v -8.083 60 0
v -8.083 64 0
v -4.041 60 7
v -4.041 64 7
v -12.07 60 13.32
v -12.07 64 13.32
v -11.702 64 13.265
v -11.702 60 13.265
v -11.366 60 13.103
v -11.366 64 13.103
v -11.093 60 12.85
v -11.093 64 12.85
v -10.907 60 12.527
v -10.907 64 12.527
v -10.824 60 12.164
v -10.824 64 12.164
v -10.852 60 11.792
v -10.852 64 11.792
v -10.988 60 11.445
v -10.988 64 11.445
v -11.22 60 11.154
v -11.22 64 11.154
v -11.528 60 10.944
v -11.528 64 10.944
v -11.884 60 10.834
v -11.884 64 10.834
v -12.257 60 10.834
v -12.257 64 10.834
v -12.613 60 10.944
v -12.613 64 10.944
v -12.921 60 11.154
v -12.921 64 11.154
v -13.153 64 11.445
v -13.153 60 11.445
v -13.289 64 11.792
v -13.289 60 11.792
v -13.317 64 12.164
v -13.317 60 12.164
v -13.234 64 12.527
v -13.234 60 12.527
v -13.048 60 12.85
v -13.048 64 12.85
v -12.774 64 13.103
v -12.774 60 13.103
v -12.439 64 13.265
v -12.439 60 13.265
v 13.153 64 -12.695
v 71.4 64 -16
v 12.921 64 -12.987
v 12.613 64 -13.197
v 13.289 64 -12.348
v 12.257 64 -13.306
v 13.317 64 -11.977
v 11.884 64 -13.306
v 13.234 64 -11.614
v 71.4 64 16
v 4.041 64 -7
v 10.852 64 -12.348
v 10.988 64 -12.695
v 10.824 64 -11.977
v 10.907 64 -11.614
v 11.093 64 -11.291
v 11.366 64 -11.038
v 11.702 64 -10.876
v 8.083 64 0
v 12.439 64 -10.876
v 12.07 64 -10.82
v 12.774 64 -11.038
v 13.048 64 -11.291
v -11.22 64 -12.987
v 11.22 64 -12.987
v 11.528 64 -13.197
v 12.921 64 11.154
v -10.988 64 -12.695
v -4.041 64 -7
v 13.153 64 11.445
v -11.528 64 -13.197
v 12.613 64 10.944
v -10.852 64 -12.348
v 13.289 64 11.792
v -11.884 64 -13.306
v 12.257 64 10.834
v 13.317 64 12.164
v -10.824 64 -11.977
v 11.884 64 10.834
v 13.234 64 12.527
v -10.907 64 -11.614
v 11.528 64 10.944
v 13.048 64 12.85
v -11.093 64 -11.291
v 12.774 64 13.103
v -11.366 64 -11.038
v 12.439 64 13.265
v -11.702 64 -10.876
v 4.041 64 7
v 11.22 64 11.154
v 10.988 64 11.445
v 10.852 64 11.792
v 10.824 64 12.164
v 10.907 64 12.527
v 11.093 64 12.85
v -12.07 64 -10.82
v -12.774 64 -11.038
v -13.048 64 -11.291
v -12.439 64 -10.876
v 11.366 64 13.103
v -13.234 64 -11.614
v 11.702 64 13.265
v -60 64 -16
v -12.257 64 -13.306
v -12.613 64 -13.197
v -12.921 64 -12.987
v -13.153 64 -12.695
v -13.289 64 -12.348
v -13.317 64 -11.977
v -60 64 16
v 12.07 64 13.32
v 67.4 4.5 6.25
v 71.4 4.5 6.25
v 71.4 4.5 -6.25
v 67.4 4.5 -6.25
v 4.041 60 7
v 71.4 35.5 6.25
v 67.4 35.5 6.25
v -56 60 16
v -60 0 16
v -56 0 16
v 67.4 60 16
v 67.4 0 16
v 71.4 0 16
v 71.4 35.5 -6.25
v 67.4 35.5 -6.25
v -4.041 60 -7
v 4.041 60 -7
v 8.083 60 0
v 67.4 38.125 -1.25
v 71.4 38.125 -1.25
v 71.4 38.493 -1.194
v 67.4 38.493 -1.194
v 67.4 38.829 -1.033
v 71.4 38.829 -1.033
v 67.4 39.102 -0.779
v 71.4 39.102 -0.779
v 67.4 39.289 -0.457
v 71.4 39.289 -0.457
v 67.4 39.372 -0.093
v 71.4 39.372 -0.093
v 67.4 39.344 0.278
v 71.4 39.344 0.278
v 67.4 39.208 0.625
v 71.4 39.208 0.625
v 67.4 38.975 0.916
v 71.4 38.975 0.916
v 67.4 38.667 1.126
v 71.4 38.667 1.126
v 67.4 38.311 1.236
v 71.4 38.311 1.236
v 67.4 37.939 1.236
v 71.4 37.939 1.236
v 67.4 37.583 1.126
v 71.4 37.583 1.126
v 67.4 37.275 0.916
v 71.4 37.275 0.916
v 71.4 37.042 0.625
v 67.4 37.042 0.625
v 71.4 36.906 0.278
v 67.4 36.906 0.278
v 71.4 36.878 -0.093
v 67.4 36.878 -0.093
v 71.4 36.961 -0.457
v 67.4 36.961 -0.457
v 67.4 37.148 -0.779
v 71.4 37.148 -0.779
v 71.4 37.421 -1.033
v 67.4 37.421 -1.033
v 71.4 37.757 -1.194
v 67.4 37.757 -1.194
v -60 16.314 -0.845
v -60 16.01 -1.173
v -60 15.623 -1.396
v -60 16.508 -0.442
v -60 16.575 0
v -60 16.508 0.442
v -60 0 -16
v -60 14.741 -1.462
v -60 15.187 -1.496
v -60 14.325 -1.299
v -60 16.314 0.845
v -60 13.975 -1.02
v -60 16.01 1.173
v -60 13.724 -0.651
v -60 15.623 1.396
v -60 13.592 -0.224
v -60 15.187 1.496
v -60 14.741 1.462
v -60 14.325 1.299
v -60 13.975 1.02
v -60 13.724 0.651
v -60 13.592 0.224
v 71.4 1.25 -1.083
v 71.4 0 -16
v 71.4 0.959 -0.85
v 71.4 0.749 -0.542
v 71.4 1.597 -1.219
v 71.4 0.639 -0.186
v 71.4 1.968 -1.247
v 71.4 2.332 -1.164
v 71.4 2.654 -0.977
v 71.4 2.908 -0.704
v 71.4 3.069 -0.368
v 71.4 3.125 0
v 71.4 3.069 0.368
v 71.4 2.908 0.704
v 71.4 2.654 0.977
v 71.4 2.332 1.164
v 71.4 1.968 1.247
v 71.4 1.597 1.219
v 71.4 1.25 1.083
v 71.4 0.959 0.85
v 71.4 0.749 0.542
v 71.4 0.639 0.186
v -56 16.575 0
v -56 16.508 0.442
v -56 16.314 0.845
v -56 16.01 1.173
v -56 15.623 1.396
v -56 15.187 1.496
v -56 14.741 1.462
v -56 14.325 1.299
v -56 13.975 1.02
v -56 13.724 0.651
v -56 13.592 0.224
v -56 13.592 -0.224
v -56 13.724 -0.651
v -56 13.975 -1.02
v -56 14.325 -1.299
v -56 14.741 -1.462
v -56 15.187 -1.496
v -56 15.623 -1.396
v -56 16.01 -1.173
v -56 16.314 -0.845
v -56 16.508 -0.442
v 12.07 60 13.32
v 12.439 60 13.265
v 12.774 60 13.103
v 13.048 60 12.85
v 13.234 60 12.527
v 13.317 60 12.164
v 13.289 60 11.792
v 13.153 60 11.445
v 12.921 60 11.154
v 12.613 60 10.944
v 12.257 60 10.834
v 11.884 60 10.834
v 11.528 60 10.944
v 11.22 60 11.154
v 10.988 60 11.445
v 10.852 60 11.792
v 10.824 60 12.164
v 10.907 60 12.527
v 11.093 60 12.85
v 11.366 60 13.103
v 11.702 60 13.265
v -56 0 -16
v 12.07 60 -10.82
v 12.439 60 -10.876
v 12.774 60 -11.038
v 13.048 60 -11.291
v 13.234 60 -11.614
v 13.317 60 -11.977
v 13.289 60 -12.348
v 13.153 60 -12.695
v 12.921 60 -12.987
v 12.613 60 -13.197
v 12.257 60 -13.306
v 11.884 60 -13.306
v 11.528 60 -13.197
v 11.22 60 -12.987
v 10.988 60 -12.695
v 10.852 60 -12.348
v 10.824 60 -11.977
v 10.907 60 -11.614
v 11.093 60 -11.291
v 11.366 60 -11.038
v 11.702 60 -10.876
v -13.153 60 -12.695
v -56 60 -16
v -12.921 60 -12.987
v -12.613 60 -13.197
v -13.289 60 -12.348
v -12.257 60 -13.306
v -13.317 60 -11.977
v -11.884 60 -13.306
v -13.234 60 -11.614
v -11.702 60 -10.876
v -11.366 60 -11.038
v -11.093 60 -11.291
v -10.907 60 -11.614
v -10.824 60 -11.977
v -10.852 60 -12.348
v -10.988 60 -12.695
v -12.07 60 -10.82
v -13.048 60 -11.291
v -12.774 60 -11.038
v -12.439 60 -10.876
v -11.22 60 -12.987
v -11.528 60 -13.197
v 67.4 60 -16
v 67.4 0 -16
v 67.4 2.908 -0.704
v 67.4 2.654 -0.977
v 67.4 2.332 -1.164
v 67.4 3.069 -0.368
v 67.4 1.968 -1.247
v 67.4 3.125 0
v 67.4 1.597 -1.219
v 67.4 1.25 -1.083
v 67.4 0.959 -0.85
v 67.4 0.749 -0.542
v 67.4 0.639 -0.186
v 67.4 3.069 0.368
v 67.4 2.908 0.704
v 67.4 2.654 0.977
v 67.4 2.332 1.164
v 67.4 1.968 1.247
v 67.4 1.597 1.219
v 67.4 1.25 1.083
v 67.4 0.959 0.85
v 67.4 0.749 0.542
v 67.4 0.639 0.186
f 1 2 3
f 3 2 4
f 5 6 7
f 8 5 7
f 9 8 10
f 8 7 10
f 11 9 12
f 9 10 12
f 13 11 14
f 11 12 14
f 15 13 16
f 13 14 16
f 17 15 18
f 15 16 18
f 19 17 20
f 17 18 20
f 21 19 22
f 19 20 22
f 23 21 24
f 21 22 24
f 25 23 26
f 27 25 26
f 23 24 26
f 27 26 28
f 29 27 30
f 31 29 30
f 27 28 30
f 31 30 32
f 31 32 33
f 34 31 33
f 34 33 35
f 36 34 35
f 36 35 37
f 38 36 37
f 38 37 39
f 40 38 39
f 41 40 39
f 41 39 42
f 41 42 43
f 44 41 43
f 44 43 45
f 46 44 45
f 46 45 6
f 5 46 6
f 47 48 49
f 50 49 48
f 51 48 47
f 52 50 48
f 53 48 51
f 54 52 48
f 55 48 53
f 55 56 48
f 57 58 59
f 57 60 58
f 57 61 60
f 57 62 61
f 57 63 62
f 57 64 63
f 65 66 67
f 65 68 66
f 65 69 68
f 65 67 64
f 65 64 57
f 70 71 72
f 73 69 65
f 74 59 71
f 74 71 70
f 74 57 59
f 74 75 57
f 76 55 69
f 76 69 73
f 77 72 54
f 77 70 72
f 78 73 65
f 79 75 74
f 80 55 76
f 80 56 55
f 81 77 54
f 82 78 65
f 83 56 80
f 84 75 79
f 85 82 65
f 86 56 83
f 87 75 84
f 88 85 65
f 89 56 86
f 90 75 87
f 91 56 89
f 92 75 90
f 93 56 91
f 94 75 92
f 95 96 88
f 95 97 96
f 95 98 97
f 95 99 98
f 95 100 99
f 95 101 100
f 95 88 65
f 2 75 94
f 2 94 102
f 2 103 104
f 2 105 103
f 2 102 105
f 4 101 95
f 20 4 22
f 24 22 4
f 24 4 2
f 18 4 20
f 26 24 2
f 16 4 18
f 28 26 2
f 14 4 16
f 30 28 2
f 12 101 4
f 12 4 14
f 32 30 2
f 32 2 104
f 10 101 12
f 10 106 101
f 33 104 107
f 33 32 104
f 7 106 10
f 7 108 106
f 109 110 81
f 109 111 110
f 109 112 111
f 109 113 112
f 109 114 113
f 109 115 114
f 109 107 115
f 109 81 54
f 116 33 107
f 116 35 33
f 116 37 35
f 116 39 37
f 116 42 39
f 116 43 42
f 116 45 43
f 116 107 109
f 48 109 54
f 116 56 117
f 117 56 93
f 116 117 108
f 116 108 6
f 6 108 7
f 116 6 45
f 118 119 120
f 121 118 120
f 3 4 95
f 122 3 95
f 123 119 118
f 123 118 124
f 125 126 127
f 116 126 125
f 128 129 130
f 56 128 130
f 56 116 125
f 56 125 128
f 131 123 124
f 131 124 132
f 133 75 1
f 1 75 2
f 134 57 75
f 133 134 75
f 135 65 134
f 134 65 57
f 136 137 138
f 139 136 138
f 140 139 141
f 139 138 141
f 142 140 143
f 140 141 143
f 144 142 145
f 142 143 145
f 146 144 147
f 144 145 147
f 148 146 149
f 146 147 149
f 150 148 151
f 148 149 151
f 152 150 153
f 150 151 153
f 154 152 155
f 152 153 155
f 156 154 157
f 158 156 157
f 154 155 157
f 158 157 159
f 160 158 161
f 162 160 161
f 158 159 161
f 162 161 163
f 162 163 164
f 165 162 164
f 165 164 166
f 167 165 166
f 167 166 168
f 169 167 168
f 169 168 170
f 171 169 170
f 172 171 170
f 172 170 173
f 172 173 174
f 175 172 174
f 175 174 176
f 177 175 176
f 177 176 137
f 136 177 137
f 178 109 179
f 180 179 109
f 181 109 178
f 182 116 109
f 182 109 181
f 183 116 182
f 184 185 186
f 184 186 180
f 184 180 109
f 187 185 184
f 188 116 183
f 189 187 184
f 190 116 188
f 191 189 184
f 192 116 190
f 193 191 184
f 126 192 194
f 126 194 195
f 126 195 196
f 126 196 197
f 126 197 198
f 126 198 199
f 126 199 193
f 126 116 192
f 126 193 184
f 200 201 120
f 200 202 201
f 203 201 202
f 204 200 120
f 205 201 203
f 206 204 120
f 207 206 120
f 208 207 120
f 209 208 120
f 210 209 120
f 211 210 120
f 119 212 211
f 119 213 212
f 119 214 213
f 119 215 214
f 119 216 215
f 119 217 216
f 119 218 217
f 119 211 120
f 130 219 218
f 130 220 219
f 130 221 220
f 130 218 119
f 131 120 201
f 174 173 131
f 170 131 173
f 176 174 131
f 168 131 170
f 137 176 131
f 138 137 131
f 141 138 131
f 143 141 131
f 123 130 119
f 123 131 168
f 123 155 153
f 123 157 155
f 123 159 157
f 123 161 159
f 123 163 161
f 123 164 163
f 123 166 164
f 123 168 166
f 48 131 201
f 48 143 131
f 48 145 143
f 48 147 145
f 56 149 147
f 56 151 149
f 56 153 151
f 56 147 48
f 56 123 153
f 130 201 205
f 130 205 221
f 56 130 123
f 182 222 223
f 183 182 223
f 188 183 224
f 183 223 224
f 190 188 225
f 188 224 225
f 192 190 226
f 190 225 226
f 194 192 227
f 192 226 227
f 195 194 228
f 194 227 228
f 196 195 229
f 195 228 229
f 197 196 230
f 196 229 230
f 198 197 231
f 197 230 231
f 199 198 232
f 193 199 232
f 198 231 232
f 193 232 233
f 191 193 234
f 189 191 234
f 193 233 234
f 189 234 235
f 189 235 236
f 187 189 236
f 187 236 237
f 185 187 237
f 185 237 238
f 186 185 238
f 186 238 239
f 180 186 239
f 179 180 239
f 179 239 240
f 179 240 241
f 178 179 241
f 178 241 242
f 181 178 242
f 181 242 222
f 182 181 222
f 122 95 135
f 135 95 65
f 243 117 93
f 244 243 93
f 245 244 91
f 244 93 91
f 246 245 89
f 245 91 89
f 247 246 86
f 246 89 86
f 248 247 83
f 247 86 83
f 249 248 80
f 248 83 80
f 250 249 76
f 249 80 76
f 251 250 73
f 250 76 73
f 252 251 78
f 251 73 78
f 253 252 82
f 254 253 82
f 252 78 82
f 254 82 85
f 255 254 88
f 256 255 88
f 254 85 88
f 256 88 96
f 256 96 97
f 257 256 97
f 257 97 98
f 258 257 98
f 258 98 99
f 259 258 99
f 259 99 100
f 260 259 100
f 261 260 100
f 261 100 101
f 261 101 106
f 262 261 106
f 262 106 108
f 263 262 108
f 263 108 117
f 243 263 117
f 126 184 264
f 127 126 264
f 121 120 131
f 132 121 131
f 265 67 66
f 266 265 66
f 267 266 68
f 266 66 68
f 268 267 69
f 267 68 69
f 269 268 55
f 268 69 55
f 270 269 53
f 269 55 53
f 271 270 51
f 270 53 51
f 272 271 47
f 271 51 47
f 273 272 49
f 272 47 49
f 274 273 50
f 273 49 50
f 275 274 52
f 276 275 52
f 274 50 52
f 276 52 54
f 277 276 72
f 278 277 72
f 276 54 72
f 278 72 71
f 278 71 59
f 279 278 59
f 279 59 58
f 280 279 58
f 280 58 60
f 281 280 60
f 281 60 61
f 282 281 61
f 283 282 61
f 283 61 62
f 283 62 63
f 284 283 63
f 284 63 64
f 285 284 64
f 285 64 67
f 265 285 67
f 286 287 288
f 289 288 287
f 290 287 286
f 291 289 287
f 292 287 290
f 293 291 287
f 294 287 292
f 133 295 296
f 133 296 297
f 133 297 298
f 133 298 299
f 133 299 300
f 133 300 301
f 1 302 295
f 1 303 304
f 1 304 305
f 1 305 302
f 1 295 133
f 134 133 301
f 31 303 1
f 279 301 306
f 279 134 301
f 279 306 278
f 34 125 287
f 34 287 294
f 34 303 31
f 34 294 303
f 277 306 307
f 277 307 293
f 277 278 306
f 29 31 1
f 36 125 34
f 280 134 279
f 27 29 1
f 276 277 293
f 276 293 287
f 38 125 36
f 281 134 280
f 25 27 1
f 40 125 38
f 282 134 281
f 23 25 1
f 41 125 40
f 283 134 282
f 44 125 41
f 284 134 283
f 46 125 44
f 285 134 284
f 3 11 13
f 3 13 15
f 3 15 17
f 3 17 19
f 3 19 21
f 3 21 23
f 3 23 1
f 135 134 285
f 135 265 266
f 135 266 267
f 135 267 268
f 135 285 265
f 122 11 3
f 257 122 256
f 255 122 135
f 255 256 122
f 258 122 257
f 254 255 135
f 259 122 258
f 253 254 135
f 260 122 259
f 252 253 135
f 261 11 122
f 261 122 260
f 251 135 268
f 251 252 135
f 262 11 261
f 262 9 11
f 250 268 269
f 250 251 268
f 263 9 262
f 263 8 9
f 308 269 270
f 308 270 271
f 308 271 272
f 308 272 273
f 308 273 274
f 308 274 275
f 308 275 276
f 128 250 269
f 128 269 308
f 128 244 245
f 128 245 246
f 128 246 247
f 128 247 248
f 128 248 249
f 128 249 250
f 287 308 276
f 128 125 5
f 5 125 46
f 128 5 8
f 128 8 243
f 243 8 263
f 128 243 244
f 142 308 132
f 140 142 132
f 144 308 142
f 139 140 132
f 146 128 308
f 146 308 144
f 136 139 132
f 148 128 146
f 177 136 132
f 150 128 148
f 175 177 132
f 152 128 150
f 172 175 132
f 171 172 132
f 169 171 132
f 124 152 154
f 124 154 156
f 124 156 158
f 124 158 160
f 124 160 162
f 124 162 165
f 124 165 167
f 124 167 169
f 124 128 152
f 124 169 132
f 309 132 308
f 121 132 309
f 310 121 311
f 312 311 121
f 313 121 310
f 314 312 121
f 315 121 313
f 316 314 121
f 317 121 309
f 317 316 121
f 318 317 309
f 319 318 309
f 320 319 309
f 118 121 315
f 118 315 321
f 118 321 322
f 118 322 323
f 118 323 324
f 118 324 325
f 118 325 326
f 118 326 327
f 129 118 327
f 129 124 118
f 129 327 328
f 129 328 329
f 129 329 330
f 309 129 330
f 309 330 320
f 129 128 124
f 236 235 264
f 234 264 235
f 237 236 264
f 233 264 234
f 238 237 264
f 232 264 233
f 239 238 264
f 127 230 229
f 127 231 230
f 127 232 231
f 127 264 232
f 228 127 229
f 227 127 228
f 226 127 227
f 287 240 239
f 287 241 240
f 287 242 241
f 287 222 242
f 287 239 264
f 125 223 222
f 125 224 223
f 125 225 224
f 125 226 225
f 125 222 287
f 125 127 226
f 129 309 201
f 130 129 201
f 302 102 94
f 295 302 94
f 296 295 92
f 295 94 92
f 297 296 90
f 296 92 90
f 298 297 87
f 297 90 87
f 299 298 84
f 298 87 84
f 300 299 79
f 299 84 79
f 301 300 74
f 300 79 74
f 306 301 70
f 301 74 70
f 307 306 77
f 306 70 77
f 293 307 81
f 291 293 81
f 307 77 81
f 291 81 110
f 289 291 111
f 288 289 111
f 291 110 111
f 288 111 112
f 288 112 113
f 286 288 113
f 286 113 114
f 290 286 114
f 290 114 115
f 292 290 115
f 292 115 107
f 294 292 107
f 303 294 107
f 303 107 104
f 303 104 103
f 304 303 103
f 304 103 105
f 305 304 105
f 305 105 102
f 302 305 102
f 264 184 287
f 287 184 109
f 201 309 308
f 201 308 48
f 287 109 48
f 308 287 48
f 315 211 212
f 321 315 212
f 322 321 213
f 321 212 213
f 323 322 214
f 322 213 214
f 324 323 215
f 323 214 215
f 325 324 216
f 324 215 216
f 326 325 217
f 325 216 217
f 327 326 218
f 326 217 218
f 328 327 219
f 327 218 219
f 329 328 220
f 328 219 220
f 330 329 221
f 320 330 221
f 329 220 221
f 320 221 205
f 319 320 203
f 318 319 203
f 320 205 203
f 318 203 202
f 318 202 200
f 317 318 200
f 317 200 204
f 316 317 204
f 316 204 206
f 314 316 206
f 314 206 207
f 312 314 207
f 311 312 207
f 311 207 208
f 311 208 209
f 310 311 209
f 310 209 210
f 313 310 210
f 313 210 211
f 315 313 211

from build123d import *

# Parameters (mm, degrees)
BOSS_EXTRUDE1_DEPTH = 16
CUT_EXTRUDE2_REACH  = 149.03
SKETCH5_R           = 1.25
SKETCH5_W           = 12.5
SKETCH5_H           = 31
SKETCH5_3_R         = 1.5
CUT_EXTRUDE3_DEPTH  = 148.030473032
CUT_EXTRUDE1_REACH  = 99.211
SKETCH3_R           = 1.25


with BuildPart() as part:
    # Sketch1 → Boss-Extrude1 (new, symmetric)
    with BuildSketch(Plane.XY):
        Polygon((-56, 0), (-56, 60), (67.4, 60), (67.4, 0), (71.4, 0), (71.4, 64), (-60, 64), (-60, 0), align=None)
    extrude(amount=BOSS_EXTRUDE1_DEPTH, both=True)

    # Sketch5 → Cut-Extrude2 (cut, up to next)
    with BuildSketch(Plane(origin=(71.4, 0, 0), x_dir=(0, 0, -1), z_dir=(1, 0, 0)), mode=Mode.PRIVATE) as cut_extrude2_sk1:
        with Locations((0, 1.875)):
            Circle(SKETCH5_R)
    cut_extrude2_tool1 = extrude(cut_extrude2_sk1.sketch, amount=-CUT_EXTRUDE2_REACH, mode=Mode.PRIVATE) & part.part
    # Sketch5 → Cut-Extrude2 (cut, up to next)
    with BuildSketch(Plane(origin=(71.4, 0, 0), x_dir=(0, 0, -1), z_dir=(1, 0, 0)), mode=Mode.PRIVATE) as cut_extrude2_sk2:
        with Locations((0, 38.125)):
            Circle(SKETCH5_R)
    cut_extrude2_tool2 = extrude(cut_extrude2_sk2.sketch, amount=-CUT_EXTRUDE2_REACH, mode=Mode.PRIVATE) & part.part
    # Sketch5 → Cut-Extrude2 (cut, up to next)
    with BuildSketch(Plane(origin=(71.4, 0, 0), x_dir=(0, 0, -1), z_dir=(1, 0, 0)), mode=Mode.PRIVATE) as cut_extrude2_sk3:
        with Locations((0, 20)):
            Rectangle(SKETCH5_W, SKETCH5_H)
    cut_extrude2_tool3 = extrude(cut_extrude2_sk3.sketch, amount=-CUT_EXTRUDE2_REACH, mode=Mode.PRIVATE) & part.part
    add(cut_extrude2_tool1.solids().sort_by_distance((71.4, 1.875, 0))[0], mode=Mode.SUBTRACT)
    add(cut_extrude2_tool2.solids().sort_by_distance((71.4, 38.125, 0))[0], mode=Mode.SUBTRACT)
    add(cut_extrude2_tool3.solids().sort_by_distance((71.4, 20, 0))[0], mode=Mode.SUBTRACT)

    # Sketch5<3> → Cut-Extrude3 (cut, through all)
    with BuildSketch(Plane(origin=(71.4, 0, 0), x_dir=(0, 0, -1), z_dir=(1, 0, 0))):
        with Locations((0, 15.075)):
            Circle(SKETCH5_3_R)
    extrude(amount=-CUT_EXTRUDE3_DEPTH, mode=Mode.SUBTRACT)

    # Sketch3 → Cut-Extrude1 (cut, up to next)
    with BuildSketch(Plane(origin=(0, 64, 0), x_dir=(1, 0, 0), z_dir=(0, 1, 0)), mode=Mode.PRIVATE) as cut_extrude1_sk1:
        with Locations((-12.070312755, 12.070312755)):
            Circle(SKETCH3_R)
    cut_extrude1_tool1 = extrude(cut_extrude1_sk1.sketch, amount=-CUT_EXTRUDE1_REACH, mode=Mode.PRIVATE) & part.part
    # Sketch3 → Cut-Extrude1 (cut, up to next)
    with BuildSketch(Plane(origin=(0, 64, 0), x_dir=(1, 0, 0), z_dir=(0, 1, 0)), mode=Mode.PRIVATE) as cut_extrude1_sk2:
        with Locations((12.070312755, 12.070312755)):
            Circle(SKETCH3_R)
    cut_extrude1_tool2 = extrude(cut_extrude1_sk2.sketch, amount=-CUT_EXTRUDE1_REACH, mode=Mode.PRIVATE) & part.part
    # Sketch3 → Cut-Extrude1 (cut, up to next)
    with BuildSketch(Plane(origin=(0, 64, 0), x_dir=(1, 0, 0), z_dir=(0, 1, 0)), mode=Mode.PRIVATE) as cut_extrude1_sk3:
        with Locations((12.070312755, -12.070312755)):
            Circle(SKETCH3_R)
    cut_extrude1_tool3 = extrude(cut_extrude1_sk3.sketch, amount=-CUT_EXTRUDE1_REACH, mode=Mode.PRIVATE) & part.part
    # Sketch3 → Cut-Extrude1 (cut, up to next)
    with BuildSketch(Plane(origin=(0, 64, 0), x_dir=(1, 0, 0), z_dir=(0, 1, 0)), mode=Mode.PRIVATE) as cut_extrude1_sk4:
        with Locations((-12.070312755, -12.070312755)):
            Circle(SKETCH3_R)
    cut_extrude1_tool4 = extrude(cut_extrude1_sk4.sketch, amount=-CUT_EXTRUDE1_REACH, mode=Mode.PRIVATE) & part.part
    # Sketch3 → Cut-Extrude1 (cut, up to next)
    with BuildSketch(Plane(origin=(0, 64, 0), x_dir=(1, 0, 0), z_dir=(0, 1, 0)), mode=Mode.PRIVATE) as cut_extrude1_sk5:
        Polygon((4.041451884, -7), (8.082903769, 0), (4.041451884, 7), (-4.041451884, 7), (-8.082903769, 0), (-4.041451884, -7), align=None)
    cut_extrude1_tool5 = extrude(cut_extrude1_sk5.sketch, amount=-CUT_EXTRUDE1_REACH, mode=Mode.PRIVATE) & part.part
    add(cut_extrude1_tool1.solids().sort_by_distance((-12.070313, 64, -12.070313))[0], mode=Mode.SUBTRACT)
    add(cut_extrude1_tool2.solids().sort_by_distance((12.070313, 64, -12.070313))[0], mode=Mode.SUBTRACT)
    add(cut_extrude1_tool3.solids().sort_by_distance((12.070313, 64, 12.070313))[0], mode=Mode.SUBTRACT)
    add(cut_extrude1_tool4.solids().sort_by_distance((-12.070313, 64, 12.070313))[0], mode=Mode.SUBTRACT)
    add(cut_extrude1_tool5.solids().sort_by_distance((0, 64, 0))[0], mode=Mode.SUBTRACT)


solid = part.part
